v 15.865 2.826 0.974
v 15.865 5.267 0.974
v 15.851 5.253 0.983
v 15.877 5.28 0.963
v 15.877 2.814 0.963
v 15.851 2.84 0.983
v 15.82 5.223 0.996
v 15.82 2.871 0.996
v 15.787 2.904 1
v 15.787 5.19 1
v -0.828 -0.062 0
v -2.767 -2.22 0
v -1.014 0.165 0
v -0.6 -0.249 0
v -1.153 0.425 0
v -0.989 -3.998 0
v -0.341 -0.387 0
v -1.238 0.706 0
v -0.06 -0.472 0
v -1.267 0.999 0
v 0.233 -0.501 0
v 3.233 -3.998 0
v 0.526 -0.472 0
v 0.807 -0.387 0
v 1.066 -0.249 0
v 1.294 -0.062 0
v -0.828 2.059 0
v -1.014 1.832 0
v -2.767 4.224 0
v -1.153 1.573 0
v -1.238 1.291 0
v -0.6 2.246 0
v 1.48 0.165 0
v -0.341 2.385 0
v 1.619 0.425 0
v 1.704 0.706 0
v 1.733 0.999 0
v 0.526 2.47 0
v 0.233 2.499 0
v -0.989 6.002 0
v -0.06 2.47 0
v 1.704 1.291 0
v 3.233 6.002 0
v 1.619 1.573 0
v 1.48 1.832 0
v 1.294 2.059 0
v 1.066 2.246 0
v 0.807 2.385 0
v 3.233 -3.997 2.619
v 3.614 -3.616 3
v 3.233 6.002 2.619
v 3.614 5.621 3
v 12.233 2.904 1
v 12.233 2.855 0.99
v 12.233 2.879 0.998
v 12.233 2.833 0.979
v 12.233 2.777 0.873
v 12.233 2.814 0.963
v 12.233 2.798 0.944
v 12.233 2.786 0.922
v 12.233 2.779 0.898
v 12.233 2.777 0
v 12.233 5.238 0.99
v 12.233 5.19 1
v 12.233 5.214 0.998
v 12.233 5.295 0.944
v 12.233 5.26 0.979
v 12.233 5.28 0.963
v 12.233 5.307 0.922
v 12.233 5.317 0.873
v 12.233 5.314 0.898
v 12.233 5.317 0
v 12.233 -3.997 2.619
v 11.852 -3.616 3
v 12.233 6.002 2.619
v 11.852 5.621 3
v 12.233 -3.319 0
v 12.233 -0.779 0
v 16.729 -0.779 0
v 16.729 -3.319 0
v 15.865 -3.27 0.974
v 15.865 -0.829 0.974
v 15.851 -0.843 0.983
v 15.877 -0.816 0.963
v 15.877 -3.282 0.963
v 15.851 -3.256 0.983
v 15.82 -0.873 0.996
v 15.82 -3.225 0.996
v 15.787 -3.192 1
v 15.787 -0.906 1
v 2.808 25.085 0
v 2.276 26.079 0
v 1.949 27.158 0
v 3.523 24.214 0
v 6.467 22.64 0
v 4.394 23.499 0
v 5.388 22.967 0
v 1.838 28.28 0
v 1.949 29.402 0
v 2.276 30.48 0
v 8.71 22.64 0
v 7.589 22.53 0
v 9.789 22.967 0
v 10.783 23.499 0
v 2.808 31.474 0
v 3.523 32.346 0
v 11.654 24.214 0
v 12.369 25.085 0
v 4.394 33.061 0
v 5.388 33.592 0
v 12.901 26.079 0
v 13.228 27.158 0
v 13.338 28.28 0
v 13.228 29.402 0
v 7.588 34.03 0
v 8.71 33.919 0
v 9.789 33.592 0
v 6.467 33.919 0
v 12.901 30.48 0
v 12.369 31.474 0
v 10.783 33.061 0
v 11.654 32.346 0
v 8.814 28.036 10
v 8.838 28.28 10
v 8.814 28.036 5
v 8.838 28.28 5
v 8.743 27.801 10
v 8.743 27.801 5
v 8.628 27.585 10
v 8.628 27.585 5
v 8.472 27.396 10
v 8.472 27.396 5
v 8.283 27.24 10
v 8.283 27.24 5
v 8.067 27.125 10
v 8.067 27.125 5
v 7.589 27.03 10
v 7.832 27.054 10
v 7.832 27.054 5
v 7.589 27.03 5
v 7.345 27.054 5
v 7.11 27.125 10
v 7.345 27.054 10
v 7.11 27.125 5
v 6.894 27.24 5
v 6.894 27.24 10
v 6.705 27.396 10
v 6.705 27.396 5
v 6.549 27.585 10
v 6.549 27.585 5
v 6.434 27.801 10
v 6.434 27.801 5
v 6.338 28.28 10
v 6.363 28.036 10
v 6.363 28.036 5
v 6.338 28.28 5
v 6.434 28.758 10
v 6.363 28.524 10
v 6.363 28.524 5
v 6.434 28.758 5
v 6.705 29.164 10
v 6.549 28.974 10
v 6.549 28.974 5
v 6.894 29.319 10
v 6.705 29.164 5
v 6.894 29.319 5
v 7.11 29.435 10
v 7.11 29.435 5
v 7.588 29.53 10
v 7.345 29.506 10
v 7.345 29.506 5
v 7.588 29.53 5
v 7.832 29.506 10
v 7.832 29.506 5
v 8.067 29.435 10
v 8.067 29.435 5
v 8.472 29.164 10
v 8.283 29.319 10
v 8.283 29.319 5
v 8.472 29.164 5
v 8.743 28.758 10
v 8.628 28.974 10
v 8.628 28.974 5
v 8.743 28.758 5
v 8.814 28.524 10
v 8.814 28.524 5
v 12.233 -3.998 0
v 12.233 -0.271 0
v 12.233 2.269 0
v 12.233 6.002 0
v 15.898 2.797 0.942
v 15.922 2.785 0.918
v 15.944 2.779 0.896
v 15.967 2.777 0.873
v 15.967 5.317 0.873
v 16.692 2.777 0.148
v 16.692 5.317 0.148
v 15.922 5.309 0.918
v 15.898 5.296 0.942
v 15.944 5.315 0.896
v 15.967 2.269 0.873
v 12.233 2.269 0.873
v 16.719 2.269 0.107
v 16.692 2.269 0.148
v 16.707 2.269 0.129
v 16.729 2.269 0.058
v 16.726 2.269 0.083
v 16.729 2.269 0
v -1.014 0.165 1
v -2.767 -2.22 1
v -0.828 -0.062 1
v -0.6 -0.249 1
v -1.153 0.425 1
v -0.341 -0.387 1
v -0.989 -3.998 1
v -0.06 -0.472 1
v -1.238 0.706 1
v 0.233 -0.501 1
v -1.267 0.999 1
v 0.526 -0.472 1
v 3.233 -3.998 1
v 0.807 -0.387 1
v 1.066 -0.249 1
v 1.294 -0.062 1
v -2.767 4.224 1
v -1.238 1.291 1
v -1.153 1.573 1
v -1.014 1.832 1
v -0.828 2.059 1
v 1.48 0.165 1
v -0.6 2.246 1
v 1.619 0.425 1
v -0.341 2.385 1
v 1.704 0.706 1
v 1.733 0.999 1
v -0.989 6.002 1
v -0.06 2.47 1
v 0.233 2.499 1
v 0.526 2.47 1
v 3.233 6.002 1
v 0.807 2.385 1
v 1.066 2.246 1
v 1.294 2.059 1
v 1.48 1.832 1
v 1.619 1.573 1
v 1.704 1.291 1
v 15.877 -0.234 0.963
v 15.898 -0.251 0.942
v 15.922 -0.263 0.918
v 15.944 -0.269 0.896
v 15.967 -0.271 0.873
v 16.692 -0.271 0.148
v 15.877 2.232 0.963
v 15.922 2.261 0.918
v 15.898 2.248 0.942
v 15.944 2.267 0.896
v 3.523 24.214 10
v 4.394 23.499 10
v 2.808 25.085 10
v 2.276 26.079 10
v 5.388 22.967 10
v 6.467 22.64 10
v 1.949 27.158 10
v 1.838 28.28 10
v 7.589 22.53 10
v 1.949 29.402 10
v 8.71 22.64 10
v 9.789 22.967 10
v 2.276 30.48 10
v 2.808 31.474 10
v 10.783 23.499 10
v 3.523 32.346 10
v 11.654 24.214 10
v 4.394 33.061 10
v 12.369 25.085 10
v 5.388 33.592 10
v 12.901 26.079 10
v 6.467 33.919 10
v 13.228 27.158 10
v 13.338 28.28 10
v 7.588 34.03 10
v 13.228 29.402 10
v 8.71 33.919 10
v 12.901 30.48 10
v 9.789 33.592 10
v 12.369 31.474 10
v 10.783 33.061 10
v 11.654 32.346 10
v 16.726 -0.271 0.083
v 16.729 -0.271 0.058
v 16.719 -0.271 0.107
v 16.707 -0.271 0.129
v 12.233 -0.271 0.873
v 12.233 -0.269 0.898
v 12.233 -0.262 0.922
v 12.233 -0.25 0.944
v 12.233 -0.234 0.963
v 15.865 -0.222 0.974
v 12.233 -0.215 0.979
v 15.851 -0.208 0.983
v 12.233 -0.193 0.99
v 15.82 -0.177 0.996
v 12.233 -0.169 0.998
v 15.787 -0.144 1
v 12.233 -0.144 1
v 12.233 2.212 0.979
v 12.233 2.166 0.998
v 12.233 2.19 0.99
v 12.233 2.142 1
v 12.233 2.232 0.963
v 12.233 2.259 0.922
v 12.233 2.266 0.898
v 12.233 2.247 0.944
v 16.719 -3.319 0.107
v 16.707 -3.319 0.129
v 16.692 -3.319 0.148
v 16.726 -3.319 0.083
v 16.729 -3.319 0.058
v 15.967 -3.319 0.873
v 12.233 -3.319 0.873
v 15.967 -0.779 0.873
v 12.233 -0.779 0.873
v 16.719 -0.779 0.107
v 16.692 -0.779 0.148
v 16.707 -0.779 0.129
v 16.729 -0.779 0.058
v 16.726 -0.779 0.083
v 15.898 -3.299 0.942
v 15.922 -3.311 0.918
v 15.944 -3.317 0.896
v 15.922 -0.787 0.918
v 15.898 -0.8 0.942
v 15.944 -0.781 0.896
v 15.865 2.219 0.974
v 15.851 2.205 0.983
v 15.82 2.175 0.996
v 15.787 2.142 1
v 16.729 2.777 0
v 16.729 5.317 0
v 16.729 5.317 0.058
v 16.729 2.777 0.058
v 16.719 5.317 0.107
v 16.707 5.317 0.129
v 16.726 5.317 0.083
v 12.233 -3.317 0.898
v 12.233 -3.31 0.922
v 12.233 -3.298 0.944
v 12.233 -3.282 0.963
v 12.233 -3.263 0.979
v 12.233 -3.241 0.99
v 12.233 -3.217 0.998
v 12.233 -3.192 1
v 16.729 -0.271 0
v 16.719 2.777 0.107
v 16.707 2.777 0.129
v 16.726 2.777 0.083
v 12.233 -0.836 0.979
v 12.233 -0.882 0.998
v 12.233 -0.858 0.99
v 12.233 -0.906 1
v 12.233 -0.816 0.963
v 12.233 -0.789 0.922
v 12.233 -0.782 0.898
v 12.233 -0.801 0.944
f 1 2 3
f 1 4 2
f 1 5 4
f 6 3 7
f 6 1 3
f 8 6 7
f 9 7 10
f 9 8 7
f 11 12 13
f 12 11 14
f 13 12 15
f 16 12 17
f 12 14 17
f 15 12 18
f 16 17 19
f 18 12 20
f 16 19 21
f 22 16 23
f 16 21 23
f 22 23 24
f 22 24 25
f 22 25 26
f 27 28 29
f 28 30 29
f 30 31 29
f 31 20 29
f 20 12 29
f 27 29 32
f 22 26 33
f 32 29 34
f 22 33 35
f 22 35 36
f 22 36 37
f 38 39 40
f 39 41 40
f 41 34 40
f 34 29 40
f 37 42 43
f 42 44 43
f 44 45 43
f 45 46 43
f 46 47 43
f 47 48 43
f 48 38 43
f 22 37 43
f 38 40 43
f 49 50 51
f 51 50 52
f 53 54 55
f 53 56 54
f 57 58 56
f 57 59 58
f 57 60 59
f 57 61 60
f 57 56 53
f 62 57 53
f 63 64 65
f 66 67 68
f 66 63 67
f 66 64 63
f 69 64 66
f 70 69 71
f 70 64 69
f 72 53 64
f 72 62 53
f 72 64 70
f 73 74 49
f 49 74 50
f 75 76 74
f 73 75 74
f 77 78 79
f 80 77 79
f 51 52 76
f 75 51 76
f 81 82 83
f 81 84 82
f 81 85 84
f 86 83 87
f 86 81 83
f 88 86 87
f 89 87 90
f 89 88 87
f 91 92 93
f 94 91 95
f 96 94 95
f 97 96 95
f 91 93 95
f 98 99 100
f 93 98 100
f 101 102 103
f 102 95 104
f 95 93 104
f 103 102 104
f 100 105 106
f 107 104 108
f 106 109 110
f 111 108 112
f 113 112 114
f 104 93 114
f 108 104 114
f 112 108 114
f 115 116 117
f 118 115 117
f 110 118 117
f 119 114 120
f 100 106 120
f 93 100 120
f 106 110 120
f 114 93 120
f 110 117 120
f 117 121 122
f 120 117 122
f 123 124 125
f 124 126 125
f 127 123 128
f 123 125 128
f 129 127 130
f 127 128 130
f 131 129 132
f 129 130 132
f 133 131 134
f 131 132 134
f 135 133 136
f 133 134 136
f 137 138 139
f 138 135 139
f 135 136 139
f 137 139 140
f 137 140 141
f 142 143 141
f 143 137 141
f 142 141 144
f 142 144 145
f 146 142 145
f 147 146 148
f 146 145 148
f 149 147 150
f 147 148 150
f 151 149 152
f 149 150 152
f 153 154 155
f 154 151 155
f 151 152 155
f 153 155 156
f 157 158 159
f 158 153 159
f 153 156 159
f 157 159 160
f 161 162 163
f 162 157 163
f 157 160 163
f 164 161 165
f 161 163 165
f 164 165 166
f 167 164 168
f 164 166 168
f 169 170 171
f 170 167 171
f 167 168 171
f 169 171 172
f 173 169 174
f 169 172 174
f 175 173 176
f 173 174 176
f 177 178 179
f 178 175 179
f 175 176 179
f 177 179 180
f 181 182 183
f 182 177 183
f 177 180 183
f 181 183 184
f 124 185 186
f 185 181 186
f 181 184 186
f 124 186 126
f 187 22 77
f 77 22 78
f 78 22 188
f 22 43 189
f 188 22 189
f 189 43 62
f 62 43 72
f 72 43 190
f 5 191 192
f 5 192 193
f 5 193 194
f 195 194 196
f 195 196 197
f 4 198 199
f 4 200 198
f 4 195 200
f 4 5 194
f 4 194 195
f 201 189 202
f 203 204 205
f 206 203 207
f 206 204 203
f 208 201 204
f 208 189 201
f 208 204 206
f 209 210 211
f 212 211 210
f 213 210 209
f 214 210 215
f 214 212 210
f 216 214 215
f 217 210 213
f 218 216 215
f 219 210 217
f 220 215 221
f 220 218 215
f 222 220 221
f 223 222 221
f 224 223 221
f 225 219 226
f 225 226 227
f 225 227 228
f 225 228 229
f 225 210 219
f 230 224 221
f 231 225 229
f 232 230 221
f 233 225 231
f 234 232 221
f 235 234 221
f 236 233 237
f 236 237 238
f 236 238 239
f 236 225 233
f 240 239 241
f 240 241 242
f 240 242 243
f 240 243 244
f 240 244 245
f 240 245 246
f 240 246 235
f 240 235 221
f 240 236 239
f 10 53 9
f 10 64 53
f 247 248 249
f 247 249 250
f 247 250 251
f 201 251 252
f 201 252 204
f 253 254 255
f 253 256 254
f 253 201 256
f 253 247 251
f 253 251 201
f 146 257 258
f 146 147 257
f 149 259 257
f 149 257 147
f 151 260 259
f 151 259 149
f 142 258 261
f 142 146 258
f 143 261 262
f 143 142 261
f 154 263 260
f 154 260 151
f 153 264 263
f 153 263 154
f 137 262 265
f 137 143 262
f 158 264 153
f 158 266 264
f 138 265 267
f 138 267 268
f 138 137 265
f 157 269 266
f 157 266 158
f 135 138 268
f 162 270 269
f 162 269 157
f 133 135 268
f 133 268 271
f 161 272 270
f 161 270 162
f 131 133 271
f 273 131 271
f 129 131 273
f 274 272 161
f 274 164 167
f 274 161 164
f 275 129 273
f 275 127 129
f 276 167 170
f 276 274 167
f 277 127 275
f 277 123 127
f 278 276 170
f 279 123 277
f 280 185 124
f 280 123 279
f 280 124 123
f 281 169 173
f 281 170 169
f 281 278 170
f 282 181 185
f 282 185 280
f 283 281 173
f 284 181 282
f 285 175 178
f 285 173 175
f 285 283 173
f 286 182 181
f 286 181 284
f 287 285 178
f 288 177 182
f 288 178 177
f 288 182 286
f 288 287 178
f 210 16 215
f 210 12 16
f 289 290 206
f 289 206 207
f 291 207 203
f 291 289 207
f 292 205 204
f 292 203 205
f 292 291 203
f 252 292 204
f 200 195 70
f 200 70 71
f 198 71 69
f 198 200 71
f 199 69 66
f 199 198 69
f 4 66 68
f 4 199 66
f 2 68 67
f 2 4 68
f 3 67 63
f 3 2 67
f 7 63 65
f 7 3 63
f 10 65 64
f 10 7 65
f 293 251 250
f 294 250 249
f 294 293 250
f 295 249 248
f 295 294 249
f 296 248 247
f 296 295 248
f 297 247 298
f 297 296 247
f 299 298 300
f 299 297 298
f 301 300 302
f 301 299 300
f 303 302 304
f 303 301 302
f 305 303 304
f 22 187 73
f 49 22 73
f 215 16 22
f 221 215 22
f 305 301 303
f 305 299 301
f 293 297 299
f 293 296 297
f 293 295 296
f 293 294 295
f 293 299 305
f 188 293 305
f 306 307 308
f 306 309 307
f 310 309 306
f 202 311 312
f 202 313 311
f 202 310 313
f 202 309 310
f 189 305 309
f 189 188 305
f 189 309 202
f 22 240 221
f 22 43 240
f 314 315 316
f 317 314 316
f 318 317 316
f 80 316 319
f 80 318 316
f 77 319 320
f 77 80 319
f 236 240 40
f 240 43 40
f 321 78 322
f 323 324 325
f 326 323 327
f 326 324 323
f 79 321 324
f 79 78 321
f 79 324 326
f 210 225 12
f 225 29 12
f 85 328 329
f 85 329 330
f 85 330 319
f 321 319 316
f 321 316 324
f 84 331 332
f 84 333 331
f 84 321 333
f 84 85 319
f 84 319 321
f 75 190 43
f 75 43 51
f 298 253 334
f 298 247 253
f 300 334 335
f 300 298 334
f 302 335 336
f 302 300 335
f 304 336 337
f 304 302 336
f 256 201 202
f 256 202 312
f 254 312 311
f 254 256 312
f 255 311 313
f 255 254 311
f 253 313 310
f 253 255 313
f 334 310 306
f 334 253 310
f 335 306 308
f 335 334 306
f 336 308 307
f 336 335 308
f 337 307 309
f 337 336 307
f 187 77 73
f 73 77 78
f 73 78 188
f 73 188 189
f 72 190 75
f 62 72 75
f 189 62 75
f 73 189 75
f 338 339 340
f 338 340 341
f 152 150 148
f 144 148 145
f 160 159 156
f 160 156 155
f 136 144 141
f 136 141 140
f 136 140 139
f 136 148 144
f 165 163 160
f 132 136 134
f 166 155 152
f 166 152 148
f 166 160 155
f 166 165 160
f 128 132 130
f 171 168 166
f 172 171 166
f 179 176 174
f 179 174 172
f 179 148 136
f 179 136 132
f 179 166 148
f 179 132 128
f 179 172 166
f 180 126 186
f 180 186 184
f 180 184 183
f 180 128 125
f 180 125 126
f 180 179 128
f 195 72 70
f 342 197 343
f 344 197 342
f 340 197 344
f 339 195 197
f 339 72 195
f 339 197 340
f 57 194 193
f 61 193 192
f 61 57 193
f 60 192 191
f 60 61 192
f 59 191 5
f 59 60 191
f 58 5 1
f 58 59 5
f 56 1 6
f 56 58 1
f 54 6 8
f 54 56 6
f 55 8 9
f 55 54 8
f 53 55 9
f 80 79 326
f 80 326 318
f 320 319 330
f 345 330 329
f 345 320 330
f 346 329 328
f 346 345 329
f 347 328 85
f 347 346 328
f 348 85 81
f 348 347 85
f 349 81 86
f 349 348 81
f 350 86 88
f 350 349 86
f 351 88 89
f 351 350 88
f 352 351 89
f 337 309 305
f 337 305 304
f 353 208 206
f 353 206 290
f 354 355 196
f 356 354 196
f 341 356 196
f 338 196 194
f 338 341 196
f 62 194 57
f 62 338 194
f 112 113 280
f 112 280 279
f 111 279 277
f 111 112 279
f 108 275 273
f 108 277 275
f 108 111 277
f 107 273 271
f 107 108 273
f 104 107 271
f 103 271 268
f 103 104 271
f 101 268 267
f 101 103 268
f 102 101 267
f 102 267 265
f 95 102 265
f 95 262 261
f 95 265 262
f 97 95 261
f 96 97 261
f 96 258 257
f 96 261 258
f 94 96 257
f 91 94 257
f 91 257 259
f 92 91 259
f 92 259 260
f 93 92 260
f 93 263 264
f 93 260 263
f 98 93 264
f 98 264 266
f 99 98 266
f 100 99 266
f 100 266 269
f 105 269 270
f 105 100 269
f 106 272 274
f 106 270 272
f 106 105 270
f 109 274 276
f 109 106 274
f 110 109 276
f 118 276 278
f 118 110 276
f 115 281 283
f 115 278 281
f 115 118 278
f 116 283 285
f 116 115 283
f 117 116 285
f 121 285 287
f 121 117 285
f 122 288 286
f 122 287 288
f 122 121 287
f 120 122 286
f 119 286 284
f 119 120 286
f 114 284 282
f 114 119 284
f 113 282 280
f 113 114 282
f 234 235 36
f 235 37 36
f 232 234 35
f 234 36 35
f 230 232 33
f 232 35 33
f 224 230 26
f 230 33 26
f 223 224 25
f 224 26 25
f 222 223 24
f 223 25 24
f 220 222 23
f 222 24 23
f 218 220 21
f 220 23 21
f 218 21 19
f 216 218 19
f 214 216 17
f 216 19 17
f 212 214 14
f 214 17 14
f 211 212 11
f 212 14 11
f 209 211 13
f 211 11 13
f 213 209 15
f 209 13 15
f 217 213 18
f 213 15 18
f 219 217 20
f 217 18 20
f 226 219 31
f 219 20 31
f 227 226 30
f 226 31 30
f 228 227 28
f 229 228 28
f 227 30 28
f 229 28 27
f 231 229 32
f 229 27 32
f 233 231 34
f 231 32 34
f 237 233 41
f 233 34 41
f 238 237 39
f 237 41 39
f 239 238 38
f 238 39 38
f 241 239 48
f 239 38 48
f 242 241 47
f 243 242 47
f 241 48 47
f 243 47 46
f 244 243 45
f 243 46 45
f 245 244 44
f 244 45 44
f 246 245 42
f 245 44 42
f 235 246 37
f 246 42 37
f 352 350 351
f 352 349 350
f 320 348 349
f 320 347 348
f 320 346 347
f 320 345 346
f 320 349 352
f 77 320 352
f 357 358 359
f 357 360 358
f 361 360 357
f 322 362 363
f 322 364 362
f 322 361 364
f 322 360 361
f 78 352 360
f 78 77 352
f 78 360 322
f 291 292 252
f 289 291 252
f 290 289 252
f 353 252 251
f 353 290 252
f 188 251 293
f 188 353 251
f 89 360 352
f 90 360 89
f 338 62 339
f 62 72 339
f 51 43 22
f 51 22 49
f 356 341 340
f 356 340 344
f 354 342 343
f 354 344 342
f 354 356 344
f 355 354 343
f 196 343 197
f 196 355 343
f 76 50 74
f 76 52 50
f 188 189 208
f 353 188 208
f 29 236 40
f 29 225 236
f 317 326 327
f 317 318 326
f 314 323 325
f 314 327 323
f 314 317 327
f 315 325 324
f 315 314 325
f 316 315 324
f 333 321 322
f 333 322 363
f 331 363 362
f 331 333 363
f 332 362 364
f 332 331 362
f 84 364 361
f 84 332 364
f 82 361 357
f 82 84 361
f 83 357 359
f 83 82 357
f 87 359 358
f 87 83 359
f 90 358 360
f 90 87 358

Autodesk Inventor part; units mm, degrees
ref_plane "YZ Plane" through (0, 0, 0) normal (1, 0, 0) x (0, 1, 0)
ref_plane "XZ Plane" through (0, 0, 0) normal (0, 1, 0) x (-1, 0, 0)
ref_plane "XY Plane" through (0, 0, 0) normal (0, 0, 1) x (1, 0, 0)
sketch "Sketch1" plane through (0, 0, 0) normal (0, 0, 1) x (1, 0, 0)
  line L0 (35.093, -7.2202) -> (-19.907, -7.2202)
  line L1 (-19.907, -7.2202) -> (-19.907, 74.7798)
  line L2 (-19.907, 74.7798) -> (35.093, 74.7798)
  line L3 (35.093, 74.7798) -> (35.093, -7.2202)
  line L4 (-1.6316, 73.7798) -> (15.8684, 73.7798)
  line L5 (15.8684, 73.7798) -> (15.8684, 38.2798)
  line L6 (15.8684, 38.2798) -> (-1.6316, 38.2798)
  line L7 (-1.6316, 38.2798) -> (-1.6316, 73.7798)
  circle A0 centre (7.5885, 28.2798) radius 5.75
  line L8 (12.233, 6.0025) -> (3.233, 6.0025)
  line L9 (3.233, 6.0025) -> (3.233, -3.9975)
  line L10 (3.233, -3.9975) -> (12.233, -3.9975)
  line L11 (12.233, -3.9975) -> (12.233, 6.0025)
  circle A1 centre (7.5885, 28.2798) radius 1.25
  line L12 (3.233, 6.0025) -> (-2.767, 6.0025)
  line L13 (-2.767, 6.0025) -> (-2.767, -3.9975)
  line L14 (-2.767, -3.9975) -> (3.233, -3.9975)
  line L15 (3.233, -3.9975) -> (3.233, 6.0025)
  line L16 (12.233, 5.3167) -> (16.7288, 5.3167)
  line L17 (16.7288, 5.3167) -> (16.7288, 2.7767)
  line L18 (16.7288, 2.7767) -> (12.233, 2.7767)
  line L19 (12.233, 2.7767) -> (12.233, 5.3167)
  line L20 (12.233, -1.5375) -> (12.233, 1.0025)
  line L21 (12.233, -3.4895) -> (12.233, -0.9495)
  line L22 (12.233, 2.2687) -> (16.7288, 2.2687)
  line L23 (16.7288, 2.2687) -> (16.7288, -0.2713)
  line L24 (16.7288, -0.2713) -> (12.233, -0.2713)
  line L25 (12.233, -0.2713) -> (12.233, 2.2687)
  line L26 (12.233, -0.7793) -> (16.7288, -0.7793)
  line L27 (16.7288, -0.7793) -> (16.7288, -3.3193)
  line L28 (16.7288, -3.3193) -> (12.233, -3.3193)
  line L29 (12.233, -3.3193) -> (12.233, -0.7793)
  circle A2 centre (0.233, 0.9987) radius 1.5
  circle A3 centre (0.3684, 66.2798) radius 0.75
  circle A4 centre (0.3684, 63.7398) radius 0.75
  circle A5 centre (0.3684, 61.1998) radius 0.75
  circle A6 centre (0.3684, 58.6598) radius 0.75
  circle A7 centre (0.3684, 56.1198) radius 0.75
  circle A8 centre (0.3684, 53.5798) radius 0.75
  circle A9 centre (0.3684, 51.0398) radius 0.75
  circle A10 centre (0.3684, 48.4998) radius 0.75
  circle A11 centre (13.8684, 66.2798) radius 0.75
  circle A12 centre (13.8684, 63.7398) radius 0.75
  circle A13 centre (13.8684, 61.1998) radius 0.75
  circle A14 centre (13.8684, 58.6598) radius 0.75
  circle A15 centre (13.8684, 56.1198) radius 0.75
  circle A16 centre (13.8684, 53.5798) radius 0.75
  circle A17 centre (13.8684, 51.0398) radius 0.75
  circle A18 centre (13.8684, 48.4998) radius 0.75
  line L30 (-17.907, 69.7798) -> (-16.407, 69.7798)
  line L31 (-16.407, 69.7798) -> (-16.407, -2.2202)
  line L32 (-16.407, -2.2202) -> (-17.907, -2.2202)
  line L33 (-17.907, -2.2202) -> (-17.907, 69.7798)
  line L34 (-15.367, -2.2202) -> (-13.867, -2.2202)
  line L35 (-13.867, -2.2202) -> (-13.867, 69.7798)
  line L36 (-13.867, 69.7798) -> (-15.367, 69.7798)
  line L37 (-15.367, 69.7798) -> (-15.367, -2.2202)
  line L38 (31.593, 69.7798) -> (33.093, 69.7798)
  line L39 (33.093, 69.7798) -> (33.093, -2.2202)
  line L40 (33.093, -2.2202) -> (31.593, -2.2202)
  line L41 (31.593, -2.2202) -> (31.593, 69.7798)
  line L42 (30.553, -2.2202) -> (29.053, -2.2202)
  line L43 (29.053, -2.2202) -> (29.053, 69.7798)
  line L44 (29.053, 69.7798) -> (30.553, 69.7798)
  line L45 (30.553, 69.7798) -> (30.553, -2.2202)
  line L46 (5.8684, 68.7798) -> (10.8684, 68.7798)
  line L47 (10.8684, 68.7798) -> (10.8684, 63.7798)
  line L48 (10.8684, 63.7798) -> (5.8684, 63.7798)
  line L49 (5.8684, 63.7798) -> (5.8684, 68.7798)
  line L50 (6.8684, 55.8198) -> (10.8684, 55.8198)
  line L51 (10.8684, 55.8198) -> (10.8684, 53.2798)
  line L52 (10.8684, 53.2798) -> (6.8684, 53.2798)
  line L53 (6.8684, 53.2798) -> (6.8684, 55.8198)
  line L54 (5.8684, 48.2798) -> (10.8684, 48.2798)
  line L55 (10.8684, 48.2798) -> (10.8684, 43.2798)
  line L56 (10.8684, 43.2798) -> (5.8684, 43.2798)
  line L57 (5.8684, 43.2798) -> (5.8684, 48.2798)
  circle A19 centre (0.8684, 71.2798) radius 1.5
  circle A20 centre (0.8684, 40.7798) radius 1.5
  point P0 (0, 0)
  dimension "d0" = 82
  dimension "d1" = 55
  dimension "d2" = 17.5
  dimension "d3" = 35.5
  dimension "d4" = 11.5
  dimension "d5" = 2.5
  dimension "d6" = 1
  dimension "d7" = 10
  dimension "d8" = 27.4955
  dimension "d9" = 9
  dimension "d10" = 10
  dimension "d16" = 6
  dimension "d17" = 22.86
  dimension "d18" = 19.2246
  dimension "d19" = 2.54
  dimension "d22" = 0.6858
  dimension "d24" = 10
  dimension "d25" = 2.54
  dimension "d26" = 0.508
  dimension "d27" = 4.4958
  dimension "d28" = 4.4958
  dimension "d29" = 2.54
  dimension "d30" = 4.4958
  dimension "d31" = 0.508
  dimension "d42" = 3
  dimension "d56" = 1.5
  dimension "d57" = 7.5
  dimension "d58" = 2
  dimension "d59" = 1.5
  dimension "d60" = 1.5
  dimension "d61" = 1.5
  dimension "d62" = 1.5
  dimension "d63" = 1.5
  dimension "d64" = 1.5
  dimension "d65" = 1.5
  dimension "d66" = 2.54
  dimension "d67" = 2.54
  dimension "d68" = 2.54
  dimension "d69" = 2.54
  dimension "d70" = 2.54
  dimension "d71" = 2.54
  dimension "d72" = 2.54
  dimension "d73" = 1.5
  dimension "d74" = 1.5
  dimension "d75" = 1.5
  dimension "d76" = 1.5
  dimension "d77" = 1.5
  dimension "d78" = 1.5
  dimension "d79" = 1.5
  dimension "d80" = 1.5
  dimension "d81" = 2.54
  dimension "d82" = 2.54
  dimension "d83" = 2.54
  dimension "d84" = 2.54
  dimension "d85" = 2.54
  dimension "d86" = 2.54
  dimension "d87" = 2.54
  dimension "d88" = 2
  dimension "d89" = 7.5
  dimension "d90" = 2
  dimension "d91" = 2
  dimension "d92" = 2
  dimension "d93" = 2
  dimension "d94" = 2
extrude "Extrusion1" add sketch "Sketch1" along normal blind 3 draft -0.001 contours L11 L10 L9 L8
chamfer "Chamfer1" distance 0.381 angle 45 5 edges at (7.733, 6.0025, 3) (12.2329, 5.6596, 3) (12.2329, -2.4735, 3) (7.733, -3.9974, 3) (3.233, 1.0025, 3)
extrude "Extrusion2" add sketch "Sketch1" along normal blind 1 contours L9 L14 L13 L12 | A2
chamfer "Chamfer2" distance 1.778 angle 45 2 edges at (-2.767, -3.9975, 0.5) (-2.767, 6.0025, 0.5)
extrude "Extrusion3" cut sketch "Sketch1" along normal through all contours A2
extrude "Extrusion4" add sketch "Sketch1" along normal blind 1 contours L16 L17 L18 L11 | L22 L23 L24 L11 | L11 L26 L27 L28
chamfer "Chamfer3" distance 0.889 angle 45 3 edges at (16.7288, -2.0493, 1) (16.7288, 0.9987, 1) (16.7288, 4.0467, 1)
fillet "Fillet1" radius 0.127 9 edges at (14.0364, -3.3193, 1) (15.8398, -2.0493, 1) (14.0364, -0.7793, 1) (15.8398, 0.9987, 1) (14.0364, -0.2713, 1) (14.0364, 2.2687, 1) (14.0364, 2.7767, 1) (15.8398, 4.0467, 1) (14.0364, 5.3167, 1)
fillet "Fillet2" radius 0.127 3 edges at (16.7288, -2.0493, 0.111) (16.7288, 0.9987, 0.111) (16.7288, 4.0467, 0.111)
extrude "Extrusion5" add sketch "Sketch1" along normal blind 5 contours A1
extrude "Extrusion6" add sketch "Sketch1" along normal blind 10 contours A0
properties part number "Breadboard"
